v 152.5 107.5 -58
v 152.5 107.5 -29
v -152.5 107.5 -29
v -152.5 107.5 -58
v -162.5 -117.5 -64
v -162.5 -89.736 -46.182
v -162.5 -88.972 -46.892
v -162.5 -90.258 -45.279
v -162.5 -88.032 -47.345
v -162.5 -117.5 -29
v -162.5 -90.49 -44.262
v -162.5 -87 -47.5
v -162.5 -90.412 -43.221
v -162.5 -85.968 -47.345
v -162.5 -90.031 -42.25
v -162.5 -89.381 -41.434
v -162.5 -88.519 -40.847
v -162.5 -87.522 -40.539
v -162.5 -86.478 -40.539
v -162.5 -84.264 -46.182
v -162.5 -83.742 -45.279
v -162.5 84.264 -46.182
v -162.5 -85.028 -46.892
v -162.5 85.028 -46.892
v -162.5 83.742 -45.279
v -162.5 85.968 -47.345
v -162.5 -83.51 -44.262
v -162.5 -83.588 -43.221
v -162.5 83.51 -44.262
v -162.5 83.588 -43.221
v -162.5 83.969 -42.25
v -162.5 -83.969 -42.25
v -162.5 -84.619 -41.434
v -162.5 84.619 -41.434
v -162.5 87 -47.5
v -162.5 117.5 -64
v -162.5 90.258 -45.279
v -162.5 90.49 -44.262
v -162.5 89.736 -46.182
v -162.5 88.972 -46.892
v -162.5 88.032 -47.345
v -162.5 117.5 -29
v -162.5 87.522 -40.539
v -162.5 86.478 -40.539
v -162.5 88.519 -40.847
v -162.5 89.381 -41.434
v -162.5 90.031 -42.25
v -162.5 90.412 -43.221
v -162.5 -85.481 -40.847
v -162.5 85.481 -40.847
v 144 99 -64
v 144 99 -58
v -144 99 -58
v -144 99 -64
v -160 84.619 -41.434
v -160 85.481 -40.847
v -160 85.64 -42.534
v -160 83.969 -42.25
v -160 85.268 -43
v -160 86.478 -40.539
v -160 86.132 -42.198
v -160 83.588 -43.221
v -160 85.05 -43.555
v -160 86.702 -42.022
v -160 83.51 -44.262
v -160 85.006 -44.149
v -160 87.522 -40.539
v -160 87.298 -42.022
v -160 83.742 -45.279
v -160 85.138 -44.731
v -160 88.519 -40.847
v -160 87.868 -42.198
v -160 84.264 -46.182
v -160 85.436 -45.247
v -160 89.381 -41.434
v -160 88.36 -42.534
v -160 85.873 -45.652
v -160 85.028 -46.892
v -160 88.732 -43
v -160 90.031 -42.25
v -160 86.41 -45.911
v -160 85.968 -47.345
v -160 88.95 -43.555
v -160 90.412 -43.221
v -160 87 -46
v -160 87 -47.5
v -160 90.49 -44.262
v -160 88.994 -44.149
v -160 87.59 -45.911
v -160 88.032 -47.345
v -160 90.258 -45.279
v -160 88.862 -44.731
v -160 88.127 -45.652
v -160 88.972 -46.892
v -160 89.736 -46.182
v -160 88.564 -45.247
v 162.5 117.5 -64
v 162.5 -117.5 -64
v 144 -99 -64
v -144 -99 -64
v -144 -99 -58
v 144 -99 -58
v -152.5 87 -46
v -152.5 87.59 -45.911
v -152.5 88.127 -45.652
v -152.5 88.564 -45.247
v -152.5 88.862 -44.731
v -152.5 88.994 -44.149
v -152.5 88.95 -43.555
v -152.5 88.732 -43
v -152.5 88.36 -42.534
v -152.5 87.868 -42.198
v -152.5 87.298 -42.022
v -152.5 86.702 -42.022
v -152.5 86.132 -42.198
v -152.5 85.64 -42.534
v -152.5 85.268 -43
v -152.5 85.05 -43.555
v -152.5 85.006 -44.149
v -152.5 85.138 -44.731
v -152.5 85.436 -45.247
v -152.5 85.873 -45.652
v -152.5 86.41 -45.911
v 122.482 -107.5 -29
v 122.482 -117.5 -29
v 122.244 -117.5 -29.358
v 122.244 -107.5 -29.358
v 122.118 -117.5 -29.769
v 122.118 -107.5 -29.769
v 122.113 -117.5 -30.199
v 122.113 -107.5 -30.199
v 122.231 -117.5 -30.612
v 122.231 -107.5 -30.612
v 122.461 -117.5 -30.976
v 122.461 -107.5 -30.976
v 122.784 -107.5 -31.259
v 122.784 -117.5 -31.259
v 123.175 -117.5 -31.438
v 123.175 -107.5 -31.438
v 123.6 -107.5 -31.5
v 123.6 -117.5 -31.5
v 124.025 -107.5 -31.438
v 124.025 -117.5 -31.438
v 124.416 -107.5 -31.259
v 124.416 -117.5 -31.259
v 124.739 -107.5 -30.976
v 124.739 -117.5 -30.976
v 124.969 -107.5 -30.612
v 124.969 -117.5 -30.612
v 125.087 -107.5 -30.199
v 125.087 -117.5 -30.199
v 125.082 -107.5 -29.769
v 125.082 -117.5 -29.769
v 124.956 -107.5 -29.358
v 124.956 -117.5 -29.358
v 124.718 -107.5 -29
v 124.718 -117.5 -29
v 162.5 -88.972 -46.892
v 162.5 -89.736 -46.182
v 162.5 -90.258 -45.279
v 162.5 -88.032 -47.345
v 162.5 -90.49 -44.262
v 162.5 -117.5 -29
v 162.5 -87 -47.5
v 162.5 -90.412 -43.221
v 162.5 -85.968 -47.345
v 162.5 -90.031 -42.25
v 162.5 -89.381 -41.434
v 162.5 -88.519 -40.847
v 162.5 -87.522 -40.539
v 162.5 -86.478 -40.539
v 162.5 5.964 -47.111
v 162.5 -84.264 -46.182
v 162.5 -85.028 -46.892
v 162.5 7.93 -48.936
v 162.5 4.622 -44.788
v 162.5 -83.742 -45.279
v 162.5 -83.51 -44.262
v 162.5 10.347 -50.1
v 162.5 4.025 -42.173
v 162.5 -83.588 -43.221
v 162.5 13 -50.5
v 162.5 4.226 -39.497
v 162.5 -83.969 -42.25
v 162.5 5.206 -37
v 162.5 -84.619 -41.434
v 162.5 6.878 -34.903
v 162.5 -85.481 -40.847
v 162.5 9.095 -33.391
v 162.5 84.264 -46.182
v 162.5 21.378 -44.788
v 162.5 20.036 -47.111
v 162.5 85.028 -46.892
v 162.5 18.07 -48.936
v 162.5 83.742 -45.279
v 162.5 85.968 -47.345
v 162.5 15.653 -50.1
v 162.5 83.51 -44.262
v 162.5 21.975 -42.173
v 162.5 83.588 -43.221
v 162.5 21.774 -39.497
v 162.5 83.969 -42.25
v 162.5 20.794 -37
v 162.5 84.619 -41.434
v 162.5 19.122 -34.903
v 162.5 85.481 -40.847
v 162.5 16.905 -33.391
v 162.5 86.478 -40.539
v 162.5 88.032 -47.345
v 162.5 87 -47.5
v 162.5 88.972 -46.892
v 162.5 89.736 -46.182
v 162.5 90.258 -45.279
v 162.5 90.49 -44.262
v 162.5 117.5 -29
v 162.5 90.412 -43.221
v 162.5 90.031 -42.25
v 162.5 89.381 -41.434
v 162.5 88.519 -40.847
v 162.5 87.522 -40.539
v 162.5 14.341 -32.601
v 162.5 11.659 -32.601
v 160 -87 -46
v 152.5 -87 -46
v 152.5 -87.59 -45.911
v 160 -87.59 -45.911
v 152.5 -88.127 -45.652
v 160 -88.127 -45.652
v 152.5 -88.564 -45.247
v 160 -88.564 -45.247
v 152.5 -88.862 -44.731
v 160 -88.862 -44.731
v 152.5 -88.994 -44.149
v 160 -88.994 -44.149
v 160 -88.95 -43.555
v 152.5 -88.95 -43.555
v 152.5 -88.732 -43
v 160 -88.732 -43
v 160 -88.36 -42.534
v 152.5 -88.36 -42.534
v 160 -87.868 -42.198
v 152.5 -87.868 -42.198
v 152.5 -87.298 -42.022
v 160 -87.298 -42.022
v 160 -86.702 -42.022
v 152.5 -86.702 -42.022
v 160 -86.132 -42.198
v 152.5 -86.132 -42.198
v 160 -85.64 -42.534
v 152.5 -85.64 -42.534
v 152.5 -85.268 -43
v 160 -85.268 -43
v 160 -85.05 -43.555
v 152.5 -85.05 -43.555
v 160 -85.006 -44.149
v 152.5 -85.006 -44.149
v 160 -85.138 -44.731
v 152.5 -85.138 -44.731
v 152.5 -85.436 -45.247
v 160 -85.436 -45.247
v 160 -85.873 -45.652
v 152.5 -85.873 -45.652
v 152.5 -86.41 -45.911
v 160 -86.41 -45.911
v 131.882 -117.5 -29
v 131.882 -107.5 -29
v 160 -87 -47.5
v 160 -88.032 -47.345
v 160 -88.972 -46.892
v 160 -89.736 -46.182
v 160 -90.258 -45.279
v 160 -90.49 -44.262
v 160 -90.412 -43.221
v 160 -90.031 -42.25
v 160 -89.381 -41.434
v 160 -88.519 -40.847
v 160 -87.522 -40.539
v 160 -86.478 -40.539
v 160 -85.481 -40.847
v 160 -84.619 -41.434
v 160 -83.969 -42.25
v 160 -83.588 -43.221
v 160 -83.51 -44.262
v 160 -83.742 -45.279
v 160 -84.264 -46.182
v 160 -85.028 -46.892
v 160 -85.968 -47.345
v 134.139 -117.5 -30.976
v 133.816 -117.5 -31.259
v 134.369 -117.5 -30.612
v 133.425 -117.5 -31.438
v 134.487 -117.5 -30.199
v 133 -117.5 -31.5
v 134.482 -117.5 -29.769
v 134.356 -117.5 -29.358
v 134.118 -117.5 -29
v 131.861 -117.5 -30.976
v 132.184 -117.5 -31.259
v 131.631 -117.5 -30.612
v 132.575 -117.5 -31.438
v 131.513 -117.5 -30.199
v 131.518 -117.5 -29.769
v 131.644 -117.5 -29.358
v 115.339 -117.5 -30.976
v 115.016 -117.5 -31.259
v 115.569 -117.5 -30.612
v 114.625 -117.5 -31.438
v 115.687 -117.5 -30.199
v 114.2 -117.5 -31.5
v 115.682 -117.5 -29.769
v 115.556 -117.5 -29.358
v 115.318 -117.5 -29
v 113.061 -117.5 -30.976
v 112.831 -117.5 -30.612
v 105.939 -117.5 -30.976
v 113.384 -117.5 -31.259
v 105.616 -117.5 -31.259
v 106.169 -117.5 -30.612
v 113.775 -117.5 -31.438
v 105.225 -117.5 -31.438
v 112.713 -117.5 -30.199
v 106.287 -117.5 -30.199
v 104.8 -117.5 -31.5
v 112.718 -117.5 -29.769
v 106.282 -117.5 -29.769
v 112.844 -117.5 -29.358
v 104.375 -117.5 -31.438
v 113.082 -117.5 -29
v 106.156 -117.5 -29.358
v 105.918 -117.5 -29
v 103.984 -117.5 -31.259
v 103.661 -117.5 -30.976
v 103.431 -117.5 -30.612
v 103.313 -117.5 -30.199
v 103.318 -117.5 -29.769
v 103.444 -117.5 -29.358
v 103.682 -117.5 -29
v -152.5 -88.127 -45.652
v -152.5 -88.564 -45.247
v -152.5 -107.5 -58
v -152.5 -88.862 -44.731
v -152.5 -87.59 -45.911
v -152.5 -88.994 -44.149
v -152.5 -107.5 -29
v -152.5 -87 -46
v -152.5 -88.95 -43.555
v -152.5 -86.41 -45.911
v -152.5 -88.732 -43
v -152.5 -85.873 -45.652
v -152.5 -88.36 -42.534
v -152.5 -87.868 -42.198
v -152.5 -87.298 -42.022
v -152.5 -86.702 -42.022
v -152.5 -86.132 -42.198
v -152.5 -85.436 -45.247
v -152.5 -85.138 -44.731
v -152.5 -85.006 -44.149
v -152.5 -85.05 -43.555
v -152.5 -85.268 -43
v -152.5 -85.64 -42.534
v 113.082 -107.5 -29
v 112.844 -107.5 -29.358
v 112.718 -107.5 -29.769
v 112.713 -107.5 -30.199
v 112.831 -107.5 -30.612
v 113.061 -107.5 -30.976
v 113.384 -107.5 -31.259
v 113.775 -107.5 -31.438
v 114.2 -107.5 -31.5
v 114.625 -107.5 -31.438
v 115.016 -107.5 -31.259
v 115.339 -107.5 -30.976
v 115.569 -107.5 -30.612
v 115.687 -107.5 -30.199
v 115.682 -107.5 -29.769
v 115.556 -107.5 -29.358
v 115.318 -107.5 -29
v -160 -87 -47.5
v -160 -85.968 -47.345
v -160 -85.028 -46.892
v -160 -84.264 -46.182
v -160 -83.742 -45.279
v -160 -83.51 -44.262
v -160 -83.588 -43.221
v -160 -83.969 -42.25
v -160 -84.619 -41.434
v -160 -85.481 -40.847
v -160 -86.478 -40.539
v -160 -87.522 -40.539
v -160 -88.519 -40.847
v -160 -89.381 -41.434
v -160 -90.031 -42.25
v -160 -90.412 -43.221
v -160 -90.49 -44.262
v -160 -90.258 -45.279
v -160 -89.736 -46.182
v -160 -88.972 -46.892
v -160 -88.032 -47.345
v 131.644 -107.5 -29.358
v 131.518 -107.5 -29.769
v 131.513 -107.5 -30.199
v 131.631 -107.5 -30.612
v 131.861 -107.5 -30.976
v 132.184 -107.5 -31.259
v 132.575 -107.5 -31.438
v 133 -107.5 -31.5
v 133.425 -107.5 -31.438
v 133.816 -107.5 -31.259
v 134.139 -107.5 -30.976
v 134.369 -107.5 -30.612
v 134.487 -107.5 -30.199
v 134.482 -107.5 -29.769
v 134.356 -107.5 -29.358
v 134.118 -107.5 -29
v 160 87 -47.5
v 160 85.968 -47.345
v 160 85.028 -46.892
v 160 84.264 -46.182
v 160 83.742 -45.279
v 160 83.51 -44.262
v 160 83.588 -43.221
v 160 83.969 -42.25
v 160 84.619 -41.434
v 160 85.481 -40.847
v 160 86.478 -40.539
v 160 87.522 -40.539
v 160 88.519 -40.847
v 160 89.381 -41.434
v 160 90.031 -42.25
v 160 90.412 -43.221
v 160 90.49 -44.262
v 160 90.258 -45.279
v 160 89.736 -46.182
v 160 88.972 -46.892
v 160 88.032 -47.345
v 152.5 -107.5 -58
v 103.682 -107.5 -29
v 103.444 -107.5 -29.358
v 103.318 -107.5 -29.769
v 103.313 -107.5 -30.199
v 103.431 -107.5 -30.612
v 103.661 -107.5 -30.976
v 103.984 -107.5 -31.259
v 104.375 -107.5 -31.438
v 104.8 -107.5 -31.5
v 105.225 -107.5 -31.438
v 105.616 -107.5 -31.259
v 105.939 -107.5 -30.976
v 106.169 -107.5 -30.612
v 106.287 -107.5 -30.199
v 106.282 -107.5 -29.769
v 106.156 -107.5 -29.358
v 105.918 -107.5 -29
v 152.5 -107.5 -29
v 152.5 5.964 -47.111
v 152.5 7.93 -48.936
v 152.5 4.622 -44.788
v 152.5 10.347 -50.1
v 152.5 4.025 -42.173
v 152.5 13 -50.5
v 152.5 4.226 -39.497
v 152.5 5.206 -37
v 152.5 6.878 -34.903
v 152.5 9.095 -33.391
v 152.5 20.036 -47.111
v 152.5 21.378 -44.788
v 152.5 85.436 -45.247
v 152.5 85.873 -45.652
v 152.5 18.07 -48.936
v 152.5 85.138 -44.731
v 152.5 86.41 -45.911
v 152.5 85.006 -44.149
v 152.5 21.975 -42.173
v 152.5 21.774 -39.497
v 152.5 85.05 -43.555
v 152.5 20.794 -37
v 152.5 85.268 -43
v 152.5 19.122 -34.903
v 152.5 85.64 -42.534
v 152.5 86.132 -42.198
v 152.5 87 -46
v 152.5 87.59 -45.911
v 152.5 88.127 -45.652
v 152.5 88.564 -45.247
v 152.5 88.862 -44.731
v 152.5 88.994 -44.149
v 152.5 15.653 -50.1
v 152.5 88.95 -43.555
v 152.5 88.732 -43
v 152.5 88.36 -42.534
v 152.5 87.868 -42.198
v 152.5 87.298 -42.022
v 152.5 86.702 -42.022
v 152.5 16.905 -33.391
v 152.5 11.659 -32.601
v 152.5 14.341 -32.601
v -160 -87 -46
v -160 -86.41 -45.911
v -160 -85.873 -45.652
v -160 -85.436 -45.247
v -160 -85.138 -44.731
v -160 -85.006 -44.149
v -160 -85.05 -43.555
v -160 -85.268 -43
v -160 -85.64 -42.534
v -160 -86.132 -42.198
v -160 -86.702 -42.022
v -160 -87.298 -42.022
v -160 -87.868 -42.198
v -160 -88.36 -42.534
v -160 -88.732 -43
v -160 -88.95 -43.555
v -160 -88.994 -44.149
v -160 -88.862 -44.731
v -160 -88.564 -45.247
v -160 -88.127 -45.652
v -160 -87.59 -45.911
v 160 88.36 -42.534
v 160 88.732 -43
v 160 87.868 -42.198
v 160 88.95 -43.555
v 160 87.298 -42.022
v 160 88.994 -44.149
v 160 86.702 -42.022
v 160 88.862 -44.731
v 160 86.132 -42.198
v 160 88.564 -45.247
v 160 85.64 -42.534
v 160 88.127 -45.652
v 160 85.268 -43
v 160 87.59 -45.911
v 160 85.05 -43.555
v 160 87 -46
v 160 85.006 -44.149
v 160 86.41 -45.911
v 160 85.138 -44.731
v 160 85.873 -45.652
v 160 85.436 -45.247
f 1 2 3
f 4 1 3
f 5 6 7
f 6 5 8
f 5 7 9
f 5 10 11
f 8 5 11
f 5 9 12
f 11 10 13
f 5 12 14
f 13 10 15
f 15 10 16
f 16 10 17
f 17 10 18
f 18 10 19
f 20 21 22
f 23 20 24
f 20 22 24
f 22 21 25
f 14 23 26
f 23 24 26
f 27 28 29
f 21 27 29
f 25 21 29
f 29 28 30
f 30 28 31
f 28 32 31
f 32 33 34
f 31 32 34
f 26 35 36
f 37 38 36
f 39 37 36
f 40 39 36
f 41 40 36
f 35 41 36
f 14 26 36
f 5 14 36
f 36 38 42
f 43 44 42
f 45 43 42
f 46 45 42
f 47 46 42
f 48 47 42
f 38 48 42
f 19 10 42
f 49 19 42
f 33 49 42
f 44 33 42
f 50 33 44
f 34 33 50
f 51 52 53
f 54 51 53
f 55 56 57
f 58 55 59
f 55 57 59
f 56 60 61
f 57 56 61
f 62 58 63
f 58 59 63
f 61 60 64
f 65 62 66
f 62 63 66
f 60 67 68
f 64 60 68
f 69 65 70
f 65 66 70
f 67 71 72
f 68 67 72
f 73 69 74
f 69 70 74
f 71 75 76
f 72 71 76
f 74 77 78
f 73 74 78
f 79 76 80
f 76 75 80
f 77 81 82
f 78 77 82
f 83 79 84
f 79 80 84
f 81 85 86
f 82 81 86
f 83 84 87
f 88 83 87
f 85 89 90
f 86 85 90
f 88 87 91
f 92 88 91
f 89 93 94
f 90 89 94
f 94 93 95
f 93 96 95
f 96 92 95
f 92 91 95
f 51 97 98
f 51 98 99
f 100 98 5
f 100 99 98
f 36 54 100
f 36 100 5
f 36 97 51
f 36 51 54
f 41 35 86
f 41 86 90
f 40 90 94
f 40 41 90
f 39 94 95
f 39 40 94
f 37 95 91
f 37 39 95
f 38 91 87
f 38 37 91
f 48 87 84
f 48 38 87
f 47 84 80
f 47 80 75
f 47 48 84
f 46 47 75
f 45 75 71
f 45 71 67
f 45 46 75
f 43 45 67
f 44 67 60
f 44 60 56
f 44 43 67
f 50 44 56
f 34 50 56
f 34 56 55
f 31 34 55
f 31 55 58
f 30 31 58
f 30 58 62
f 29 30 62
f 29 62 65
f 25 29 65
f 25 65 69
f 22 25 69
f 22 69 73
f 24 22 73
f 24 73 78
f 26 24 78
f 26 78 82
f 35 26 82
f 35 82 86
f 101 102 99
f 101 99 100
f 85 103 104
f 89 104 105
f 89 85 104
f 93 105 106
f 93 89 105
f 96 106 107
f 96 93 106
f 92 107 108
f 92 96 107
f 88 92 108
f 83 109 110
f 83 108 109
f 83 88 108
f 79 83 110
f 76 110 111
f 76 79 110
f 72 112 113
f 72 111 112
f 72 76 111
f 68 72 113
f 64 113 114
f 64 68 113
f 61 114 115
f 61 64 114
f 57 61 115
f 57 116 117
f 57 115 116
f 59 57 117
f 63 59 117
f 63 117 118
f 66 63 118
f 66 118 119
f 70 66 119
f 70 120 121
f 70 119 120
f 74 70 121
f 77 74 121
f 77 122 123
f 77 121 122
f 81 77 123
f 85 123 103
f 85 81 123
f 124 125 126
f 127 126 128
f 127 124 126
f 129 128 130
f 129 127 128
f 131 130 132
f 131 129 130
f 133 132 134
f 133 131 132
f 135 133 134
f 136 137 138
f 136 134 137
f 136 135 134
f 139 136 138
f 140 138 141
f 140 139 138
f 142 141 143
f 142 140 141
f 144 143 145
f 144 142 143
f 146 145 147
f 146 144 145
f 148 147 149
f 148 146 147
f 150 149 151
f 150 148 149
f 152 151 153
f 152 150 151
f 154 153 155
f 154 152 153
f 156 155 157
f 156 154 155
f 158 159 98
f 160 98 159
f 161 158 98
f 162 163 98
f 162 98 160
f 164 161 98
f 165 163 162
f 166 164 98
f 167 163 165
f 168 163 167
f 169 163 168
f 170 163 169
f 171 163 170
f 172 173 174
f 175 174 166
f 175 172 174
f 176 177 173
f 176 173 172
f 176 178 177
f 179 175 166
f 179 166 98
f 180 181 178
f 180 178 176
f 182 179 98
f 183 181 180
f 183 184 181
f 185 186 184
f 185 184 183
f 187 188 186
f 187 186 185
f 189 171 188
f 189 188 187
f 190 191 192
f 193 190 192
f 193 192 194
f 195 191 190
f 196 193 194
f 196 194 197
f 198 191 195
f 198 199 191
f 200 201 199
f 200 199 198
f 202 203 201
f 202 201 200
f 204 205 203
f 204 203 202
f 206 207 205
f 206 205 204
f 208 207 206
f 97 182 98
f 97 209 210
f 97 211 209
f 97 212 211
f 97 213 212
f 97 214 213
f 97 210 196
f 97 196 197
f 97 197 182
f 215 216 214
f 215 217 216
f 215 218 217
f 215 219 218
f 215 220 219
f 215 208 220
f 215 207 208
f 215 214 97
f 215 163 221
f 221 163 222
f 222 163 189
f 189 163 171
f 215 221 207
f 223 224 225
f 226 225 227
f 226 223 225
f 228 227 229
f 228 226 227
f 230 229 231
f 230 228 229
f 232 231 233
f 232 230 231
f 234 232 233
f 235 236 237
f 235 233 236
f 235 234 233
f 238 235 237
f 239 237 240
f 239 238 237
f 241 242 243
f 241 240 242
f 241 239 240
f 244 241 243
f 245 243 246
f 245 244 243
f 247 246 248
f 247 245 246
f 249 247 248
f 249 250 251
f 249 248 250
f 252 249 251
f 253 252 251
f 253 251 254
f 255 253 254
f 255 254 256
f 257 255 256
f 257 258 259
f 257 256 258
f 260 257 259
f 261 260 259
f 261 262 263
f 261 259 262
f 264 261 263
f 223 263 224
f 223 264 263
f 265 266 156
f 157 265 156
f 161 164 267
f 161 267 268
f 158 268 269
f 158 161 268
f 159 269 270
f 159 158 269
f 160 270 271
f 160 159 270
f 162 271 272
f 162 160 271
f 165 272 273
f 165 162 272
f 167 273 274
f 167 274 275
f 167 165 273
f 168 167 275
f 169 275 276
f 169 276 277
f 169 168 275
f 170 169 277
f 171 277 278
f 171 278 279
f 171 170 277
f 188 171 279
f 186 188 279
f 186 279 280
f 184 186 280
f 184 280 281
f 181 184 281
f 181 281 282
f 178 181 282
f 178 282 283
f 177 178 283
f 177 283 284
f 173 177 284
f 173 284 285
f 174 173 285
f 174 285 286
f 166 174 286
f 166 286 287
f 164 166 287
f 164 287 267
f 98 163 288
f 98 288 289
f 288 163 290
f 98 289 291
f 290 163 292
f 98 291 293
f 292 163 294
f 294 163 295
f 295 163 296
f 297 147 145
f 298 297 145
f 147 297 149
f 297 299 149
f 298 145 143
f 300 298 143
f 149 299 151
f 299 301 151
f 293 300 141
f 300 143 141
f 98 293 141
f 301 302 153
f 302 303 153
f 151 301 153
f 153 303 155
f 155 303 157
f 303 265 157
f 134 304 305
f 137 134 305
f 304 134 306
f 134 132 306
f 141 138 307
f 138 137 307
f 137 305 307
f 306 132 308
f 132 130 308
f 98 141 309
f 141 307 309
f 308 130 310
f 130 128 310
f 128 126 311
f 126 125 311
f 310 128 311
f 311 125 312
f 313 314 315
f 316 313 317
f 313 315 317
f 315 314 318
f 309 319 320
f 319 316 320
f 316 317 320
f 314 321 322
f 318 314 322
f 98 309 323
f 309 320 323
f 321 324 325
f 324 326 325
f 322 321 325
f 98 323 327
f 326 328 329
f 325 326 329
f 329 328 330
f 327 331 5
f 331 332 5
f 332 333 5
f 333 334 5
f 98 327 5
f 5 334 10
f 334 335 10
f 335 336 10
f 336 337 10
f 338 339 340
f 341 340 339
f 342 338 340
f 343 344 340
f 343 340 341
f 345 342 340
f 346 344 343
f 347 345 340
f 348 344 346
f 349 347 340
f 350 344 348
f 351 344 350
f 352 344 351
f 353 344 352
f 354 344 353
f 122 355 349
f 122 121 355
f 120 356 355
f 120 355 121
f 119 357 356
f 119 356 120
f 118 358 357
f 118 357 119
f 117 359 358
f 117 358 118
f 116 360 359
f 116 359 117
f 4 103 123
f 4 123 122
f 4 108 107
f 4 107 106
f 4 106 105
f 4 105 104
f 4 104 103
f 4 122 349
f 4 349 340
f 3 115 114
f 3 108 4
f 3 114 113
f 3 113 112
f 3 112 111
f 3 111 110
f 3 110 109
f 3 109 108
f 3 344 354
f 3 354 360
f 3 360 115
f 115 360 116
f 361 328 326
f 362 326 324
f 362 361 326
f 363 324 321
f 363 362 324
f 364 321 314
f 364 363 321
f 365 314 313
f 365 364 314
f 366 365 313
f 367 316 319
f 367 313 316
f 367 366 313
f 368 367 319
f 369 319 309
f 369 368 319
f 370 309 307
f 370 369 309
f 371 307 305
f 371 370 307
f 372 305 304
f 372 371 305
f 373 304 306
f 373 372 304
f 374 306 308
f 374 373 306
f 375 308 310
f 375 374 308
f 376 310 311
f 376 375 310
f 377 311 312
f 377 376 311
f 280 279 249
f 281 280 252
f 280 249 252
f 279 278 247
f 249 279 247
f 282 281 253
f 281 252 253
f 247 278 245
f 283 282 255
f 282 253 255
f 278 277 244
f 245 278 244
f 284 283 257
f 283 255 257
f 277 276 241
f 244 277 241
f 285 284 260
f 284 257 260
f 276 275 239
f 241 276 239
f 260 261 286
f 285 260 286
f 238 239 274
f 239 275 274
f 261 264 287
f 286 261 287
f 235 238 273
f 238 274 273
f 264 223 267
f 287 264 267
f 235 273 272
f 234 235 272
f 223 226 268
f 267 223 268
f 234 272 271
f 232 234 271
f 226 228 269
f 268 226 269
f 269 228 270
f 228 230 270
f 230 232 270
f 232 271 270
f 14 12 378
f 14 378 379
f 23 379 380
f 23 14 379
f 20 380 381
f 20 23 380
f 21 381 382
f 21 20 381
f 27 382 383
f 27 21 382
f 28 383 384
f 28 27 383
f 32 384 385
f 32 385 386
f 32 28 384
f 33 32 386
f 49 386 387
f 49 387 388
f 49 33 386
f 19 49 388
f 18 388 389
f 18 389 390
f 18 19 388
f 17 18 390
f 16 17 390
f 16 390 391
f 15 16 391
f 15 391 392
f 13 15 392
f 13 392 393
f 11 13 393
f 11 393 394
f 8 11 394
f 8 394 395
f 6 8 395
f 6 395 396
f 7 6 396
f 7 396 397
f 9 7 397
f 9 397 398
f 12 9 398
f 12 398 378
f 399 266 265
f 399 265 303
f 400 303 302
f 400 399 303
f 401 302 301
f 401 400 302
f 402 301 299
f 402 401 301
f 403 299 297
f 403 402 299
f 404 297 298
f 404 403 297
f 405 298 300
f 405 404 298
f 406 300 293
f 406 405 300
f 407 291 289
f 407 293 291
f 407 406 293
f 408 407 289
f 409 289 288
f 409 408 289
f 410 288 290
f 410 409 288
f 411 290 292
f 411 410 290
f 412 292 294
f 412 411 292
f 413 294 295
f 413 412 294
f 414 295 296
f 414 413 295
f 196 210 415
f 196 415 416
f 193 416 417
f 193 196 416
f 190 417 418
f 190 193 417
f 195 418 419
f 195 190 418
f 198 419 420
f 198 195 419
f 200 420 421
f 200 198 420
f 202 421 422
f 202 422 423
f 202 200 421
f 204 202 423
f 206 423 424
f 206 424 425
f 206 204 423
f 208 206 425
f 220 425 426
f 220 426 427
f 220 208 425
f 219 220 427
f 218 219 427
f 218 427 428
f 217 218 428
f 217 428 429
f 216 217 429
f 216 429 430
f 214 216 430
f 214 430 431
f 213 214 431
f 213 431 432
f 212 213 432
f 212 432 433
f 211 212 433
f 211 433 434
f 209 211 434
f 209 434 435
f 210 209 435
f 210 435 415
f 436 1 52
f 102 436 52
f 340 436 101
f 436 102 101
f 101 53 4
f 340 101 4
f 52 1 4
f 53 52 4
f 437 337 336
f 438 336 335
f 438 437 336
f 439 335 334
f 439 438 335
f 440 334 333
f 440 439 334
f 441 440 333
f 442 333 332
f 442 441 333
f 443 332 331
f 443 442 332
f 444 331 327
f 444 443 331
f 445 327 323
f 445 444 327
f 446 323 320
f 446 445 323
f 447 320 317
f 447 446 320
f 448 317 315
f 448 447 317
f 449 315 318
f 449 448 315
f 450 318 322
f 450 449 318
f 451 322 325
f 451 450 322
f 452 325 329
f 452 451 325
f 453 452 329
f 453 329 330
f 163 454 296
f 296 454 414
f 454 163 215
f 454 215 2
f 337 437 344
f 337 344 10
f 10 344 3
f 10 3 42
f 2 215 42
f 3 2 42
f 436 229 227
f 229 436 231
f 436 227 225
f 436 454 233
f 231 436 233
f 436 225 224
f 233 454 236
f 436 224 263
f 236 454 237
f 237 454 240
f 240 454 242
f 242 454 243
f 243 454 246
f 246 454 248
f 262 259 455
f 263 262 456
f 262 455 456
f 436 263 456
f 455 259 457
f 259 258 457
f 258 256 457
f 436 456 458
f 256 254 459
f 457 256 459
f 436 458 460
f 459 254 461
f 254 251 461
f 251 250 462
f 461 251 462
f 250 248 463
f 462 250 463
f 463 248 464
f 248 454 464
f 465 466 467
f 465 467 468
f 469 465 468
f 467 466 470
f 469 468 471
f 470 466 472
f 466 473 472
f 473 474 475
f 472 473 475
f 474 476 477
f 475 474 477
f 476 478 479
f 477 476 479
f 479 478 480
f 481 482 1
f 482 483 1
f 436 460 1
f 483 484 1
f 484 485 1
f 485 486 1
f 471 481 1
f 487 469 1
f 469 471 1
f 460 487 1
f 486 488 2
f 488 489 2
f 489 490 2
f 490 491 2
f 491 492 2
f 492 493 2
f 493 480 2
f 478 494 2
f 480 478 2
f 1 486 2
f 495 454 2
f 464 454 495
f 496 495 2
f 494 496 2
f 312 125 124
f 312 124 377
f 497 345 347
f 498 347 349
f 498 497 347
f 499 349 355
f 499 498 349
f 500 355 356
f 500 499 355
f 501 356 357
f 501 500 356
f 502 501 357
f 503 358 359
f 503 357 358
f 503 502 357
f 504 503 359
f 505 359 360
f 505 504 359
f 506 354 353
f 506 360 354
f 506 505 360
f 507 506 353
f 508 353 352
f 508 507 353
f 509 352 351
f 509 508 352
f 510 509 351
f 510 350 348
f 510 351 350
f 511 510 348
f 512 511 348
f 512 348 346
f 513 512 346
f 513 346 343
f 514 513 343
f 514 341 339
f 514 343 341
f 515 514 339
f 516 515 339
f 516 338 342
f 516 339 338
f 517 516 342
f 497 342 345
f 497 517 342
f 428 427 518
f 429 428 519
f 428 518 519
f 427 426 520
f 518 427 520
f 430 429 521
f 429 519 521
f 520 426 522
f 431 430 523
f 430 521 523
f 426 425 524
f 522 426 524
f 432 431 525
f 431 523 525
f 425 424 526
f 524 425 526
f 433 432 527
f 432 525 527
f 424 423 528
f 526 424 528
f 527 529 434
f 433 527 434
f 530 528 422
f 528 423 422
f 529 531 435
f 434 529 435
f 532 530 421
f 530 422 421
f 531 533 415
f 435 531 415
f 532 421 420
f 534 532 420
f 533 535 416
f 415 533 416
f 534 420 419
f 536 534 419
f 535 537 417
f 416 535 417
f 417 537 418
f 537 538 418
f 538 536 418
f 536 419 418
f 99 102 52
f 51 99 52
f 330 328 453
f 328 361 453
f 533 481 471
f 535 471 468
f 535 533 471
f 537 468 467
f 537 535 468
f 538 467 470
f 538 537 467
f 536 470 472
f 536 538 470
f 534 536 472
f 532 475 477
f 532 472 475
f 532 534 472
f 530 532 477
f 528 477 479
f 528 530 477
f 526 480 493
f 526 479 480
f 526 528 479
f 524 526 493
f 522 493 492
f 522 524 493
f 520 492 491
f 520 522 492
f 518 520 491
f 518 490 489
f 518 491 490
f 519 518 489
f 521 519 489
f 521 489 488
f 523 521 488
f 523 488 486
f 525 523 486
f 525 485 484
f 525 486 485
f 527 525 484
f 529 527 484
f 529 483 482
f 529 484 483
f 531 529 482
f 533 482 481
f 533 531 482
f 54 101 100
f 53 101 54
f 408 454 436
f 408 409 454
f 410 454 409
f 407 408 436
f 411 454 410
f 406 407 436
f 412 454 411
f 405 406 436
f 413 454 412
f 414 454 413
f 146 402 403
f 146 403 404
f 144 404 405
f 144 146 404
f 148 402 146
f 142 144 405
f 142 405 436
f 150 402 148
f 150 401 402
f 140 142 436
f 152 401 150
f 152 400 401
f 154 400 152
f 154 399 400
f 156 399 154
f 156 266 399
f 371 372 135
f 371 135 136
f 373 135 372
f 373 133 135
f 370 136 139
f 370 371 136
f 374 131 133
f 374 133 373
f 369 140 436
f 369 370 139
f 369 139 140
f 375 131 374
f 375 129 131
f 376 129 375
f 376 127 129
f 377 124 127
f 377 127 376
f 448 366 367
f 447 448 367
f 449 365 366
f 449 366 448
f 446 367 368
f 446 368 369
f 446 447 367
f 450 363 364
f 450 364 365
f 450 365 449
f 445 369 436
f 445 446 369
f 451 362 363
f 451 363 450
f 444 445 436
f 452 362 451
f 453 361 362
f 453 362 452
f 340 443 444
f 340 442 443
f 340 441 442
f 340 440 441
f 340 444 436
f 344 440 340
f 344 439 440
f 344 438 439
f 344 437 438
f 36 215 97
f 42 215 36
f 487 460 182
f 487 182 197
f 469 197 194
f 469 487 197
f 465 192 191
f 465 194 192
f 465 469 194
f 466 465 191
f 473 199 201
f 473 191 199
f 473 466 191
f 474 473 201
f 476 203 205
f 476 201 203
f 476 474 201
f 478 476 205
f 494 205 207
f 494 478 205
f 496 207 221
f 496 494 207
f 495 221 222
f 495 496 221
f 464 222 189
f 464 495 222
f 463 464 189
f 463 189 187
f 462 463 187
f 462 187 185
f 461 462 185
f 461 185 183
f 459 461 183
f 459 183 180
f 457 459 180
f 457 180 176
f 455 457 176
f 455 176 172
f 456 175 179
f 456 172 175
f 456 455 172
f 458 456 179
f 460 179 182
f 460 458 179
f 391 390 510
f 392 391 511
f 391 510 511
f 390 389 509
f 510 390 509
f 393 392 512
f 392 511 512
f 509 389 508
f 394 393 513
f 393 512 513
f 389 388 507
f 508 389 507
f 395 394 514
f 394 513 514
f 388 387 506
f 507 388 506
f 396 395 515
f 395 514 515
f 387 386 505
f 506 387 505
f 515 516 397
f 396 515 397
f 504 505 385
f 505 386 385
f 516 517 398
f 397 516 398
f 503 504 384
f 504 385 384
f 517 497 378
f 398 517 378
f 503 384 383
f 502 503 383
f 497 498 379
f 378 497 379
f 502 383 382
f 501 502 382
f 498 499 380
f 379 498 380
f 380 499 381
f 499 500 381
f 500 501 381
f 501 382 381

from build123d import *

# Parameters (mm, degrees)
CYLINDER027_R           = 3.5
CYLINDER027_DEPTH       = 3
CYLINDER027_PITCH_ANGLE = 90
CYLINDER026_R           = 2
CYLINDER026_DEPTH       = 9
CYLINDER026_PITCH_ANGLE = 90
ARRAY023_COUNT          = 2
ARRAY024_Y_COUNT        = 2
ARRAY024_Y_PITCH        = 174
CYLINDER011_R           = 9
CYLINDER011_DEPTH       = 12
CYLINDER011_PITCH_ANGLE = 90
CYLINDER010_R           = 1.5
CYLINDER010_DEPTH       = 11
ARRAY007_X_COUNT        = 4
ARRAY007_X_PITCH        = 9.4
ARRAY007_ROLL_ANGLE     = 90
BOX005_W                = 288
BOX005_H                = 198
BOX005_DEPTH            = 6
BOX004_W                = 325
BOX004_H                = 235
BOX004_DEPTH            = 6
BOX007_W                = 305
BOX007_H                = 215
BOX007_DEPTH            = 29
BOX006_W                = 325
BOX006_H                = 235
BOX006_DEPTH            = 29
CUT014_PLACEMENT_ANGLE  = 180


with BuildPart() as case_2_frame_cut005:
    # Cylinder027 → Cylinder027 (new body)
    with BuildSketch(Plane.XY):
        Circle(CYLINDER027_R)
    extrude(amount=CYLINDER027_DEPTH)


with BuildPart() as case_2_frame_cut005_1:
    # Cylinder027 pitch: moved
    add(case_2_frame_cut005.part.rotate(Axis((0, 0, 0), (0, 1, 0)), CYLINDER027_PITCH_ANGLE))


with BuildPart() as case_2_frame_cut005_2:
    # Cylinder027 placement: moved
    add(case_2_frame_cut005_1.part)


with BuildPart() as array024:
    # Cylinder026 → Cylinder026 (new body)
    with BuildSketch(Plane.XY):
        Circle(CYLINDER026_R)
    extrude(amount=CYLINDER026_DEPTH)


with BuildPart() as array024_1:
    # Cylinder026 pitch: moved
    add(array024.part.rotate(Axis((0, 0, 0), (0, 1, 0)), CYLINDER026_PITCH_ANGLE))


with BuildPart() as array024_2:
    # Cylinder026 placement: moved
    add(array024_1.part.moved(Location((3, 0, 0))))

    # Fusion021: union CASE_2_frame_cut005
    add(case_2_frame_cut005_2.part)


with BuildPart() as array024_3:
    # Fusion021 placement: moved
    add(array024_2.part.moved(Location((-163, 87, -14))))

    # Array023: Array024 ×2 about axis
    array023_axis = Axis((0, 87, 0), (0, 0, 1))


with BuildPart() as array024_4:
    add(array024_3.part)
    for i in range(1, ARRAY023_COUNT):
        add(array024_3.part.rotate(array023_axis, i * 360 / ARRAY023_COUNT))

    # Array024 Y: Array024 ×2


with BuildPart() as array024_5:
    add(array024_4.part)
    with Locations(*[(0, -i * ARRAY024_Y_PITCH, 0) for i in range(1, ARRAY024_Y_COUNT)]):
        add(array024_4.part)


with BuildPart() as array024_6:
    # Array024 placement: moved
    add(array024_5.part.moved(Location((0, 0, -30))))


with BuildPart() as case_2_frame_cut:
    # Cylinder011 → Cylinder011 (new body)
    with BuildSketch(Plane.XY):
        Circle(CYLINDER011_R)
    extrude(amount=CYLINDER011_DEPTH)


with BuildPart() as case_2_frame_cut_1:
    # Cylinder011 pitch: moved
    add(case_2_frame_cut.part.rotate(Axis((0, 0, 0), (0, 1, 0)), CYLINDER011_PITCH_ANGLE))


with BuildPart() as case_2_frame_cut_2:
    # Cylinder011 placement: moved
    add(case_2_frame_cut_1.part.moved(Location((151, 13, -41.5))))


with BuildPart() as btn_holes:
    # Cylinder010 → Cylinder010 (new body)
    with BuildSketch(Plane(origin=(-30, -25, 0), x_dir=(1, 0, 0), z_dir=(0, 0, 1))):
        Circle(CYLINDER010_R)
    extrude(amount=CYLINDER010_DEPTH)

    # Array007 X: BTN_holes ×4


with BuildPart() as btn_holes_1:
    add(btn_holes.part)
    with Locations(*[(i * ARRAY007_X_PITCH, 0, 0) for i in range(1, ARRAY007_X_COUNT)]):
        add(btn_holes.part)


with BuildPart() as btn_holes_2:
    # Array007 roll: moved
    add(btn_holes_1.part.rotate(Axis((0, 0, 0), (1, 0, 0)), ARRAY007_ROLL_ANGLE))


with BuildPart() as btn_holes_3:
    # Array007 placement: moved
    add(btn_holes_2.part.moved(Location((-103, -106.5, 55))))


with BuildPart() as case_2_frame_ui001:
    # Box005 → Box005 (new body)
    with BuildSketch(Plane(origin=(-144, -99, 0), x_dir=(1, 0, 0), z_dir=(0, 0, 1))):
        with Locations((144, 99)):
            Rectangle(BOX005_W, BOX005_H)
    extrude(amount=BOX005_DEPTH)


with BuildPart() as case_2_frame_u001:
    # Box004 → Box004 (new body)
    with BuildSketch(Plane(origin=(-162.5, -117.5, 0), x_dir=(1, 0, 0), z_dir=(0, 0, 1))):
        with Locations((162.5, 117.5)):
            Rectangle(BOX004_W, BOX004_H)
    extrude(amount=BOX004_DEPTH)

    # Cut005: cut CASE_2_frame_ui001
    add(case_2_frame_ui001.part, mode=Mode.SUBTRACT)


with BuildPart() as case_2_frame_u001_1:
    # Cut005 placement: moved
    add(case_2_frame_u001.part.moved(Location((0, 0, 58))))


with BuildPart() as case_2_frame_li001:
    # Box007 → Box007 (new body)
    with BuildSketch(Plane(origin=(-152.5, -107.5, 0), x_dir=(1, 0, 0), z_dir=(0, 0, 1))):
        with Locations((152.5, 107.5)):
            Rectangle(BOX007_W, BOX007_H)
    extrude(amount=BOX007_DEPTH)


with BuildPart() as case_2_frame_back002:
    # Box006 → Box006 (new body)
    with BuildSketch(Plane(origin=(-162.5, -117.5, 0), x_dir=(1, 0, 0), z_dir=(0, 0, 1))):
        with Locations((162.5, 117.5)):
            Rectangle(BOX006_W, BOX006_H)
    extrude(amount=BOX006_DEPTH)

    # Cut006: cut CASE_2_frame_li001
    add(case_2_frame_li001.part, mode=Mode.SUBTRACT)


with BuildPart() as case_2_frame_back002_1:
    # Cut006 placement: moved
    add(case_2_frame_back002.part.moved(Location((0, 0, 29))))

    # Fusion018: union CASE_2_frame_u001
    add(case_2_frame_u001_1.part)

    # Cut014: cut BTN_holes
    add(btn_holes_3.part, mode=Mode.SUBTRACT)


with BuildPart() as case_2_frame_back002_2:
    # Cut014 placement: moved
    add(case_2_frame_back002_1.part.rotate(Axis((0, 0, 0), (0, 1, 0)), CUT014_PLACEMENT_ANGLE))

    # Cut019: cut CASE_2_frame_cut
    add(case_2_frame_cut_2.part, mode=Mode.SUBTRACT)

    # Cut025: cut Array024
    add(array024_6.part, mode=Mode.SUBTRACT)


solid = case_2_frame_back002_2.part
